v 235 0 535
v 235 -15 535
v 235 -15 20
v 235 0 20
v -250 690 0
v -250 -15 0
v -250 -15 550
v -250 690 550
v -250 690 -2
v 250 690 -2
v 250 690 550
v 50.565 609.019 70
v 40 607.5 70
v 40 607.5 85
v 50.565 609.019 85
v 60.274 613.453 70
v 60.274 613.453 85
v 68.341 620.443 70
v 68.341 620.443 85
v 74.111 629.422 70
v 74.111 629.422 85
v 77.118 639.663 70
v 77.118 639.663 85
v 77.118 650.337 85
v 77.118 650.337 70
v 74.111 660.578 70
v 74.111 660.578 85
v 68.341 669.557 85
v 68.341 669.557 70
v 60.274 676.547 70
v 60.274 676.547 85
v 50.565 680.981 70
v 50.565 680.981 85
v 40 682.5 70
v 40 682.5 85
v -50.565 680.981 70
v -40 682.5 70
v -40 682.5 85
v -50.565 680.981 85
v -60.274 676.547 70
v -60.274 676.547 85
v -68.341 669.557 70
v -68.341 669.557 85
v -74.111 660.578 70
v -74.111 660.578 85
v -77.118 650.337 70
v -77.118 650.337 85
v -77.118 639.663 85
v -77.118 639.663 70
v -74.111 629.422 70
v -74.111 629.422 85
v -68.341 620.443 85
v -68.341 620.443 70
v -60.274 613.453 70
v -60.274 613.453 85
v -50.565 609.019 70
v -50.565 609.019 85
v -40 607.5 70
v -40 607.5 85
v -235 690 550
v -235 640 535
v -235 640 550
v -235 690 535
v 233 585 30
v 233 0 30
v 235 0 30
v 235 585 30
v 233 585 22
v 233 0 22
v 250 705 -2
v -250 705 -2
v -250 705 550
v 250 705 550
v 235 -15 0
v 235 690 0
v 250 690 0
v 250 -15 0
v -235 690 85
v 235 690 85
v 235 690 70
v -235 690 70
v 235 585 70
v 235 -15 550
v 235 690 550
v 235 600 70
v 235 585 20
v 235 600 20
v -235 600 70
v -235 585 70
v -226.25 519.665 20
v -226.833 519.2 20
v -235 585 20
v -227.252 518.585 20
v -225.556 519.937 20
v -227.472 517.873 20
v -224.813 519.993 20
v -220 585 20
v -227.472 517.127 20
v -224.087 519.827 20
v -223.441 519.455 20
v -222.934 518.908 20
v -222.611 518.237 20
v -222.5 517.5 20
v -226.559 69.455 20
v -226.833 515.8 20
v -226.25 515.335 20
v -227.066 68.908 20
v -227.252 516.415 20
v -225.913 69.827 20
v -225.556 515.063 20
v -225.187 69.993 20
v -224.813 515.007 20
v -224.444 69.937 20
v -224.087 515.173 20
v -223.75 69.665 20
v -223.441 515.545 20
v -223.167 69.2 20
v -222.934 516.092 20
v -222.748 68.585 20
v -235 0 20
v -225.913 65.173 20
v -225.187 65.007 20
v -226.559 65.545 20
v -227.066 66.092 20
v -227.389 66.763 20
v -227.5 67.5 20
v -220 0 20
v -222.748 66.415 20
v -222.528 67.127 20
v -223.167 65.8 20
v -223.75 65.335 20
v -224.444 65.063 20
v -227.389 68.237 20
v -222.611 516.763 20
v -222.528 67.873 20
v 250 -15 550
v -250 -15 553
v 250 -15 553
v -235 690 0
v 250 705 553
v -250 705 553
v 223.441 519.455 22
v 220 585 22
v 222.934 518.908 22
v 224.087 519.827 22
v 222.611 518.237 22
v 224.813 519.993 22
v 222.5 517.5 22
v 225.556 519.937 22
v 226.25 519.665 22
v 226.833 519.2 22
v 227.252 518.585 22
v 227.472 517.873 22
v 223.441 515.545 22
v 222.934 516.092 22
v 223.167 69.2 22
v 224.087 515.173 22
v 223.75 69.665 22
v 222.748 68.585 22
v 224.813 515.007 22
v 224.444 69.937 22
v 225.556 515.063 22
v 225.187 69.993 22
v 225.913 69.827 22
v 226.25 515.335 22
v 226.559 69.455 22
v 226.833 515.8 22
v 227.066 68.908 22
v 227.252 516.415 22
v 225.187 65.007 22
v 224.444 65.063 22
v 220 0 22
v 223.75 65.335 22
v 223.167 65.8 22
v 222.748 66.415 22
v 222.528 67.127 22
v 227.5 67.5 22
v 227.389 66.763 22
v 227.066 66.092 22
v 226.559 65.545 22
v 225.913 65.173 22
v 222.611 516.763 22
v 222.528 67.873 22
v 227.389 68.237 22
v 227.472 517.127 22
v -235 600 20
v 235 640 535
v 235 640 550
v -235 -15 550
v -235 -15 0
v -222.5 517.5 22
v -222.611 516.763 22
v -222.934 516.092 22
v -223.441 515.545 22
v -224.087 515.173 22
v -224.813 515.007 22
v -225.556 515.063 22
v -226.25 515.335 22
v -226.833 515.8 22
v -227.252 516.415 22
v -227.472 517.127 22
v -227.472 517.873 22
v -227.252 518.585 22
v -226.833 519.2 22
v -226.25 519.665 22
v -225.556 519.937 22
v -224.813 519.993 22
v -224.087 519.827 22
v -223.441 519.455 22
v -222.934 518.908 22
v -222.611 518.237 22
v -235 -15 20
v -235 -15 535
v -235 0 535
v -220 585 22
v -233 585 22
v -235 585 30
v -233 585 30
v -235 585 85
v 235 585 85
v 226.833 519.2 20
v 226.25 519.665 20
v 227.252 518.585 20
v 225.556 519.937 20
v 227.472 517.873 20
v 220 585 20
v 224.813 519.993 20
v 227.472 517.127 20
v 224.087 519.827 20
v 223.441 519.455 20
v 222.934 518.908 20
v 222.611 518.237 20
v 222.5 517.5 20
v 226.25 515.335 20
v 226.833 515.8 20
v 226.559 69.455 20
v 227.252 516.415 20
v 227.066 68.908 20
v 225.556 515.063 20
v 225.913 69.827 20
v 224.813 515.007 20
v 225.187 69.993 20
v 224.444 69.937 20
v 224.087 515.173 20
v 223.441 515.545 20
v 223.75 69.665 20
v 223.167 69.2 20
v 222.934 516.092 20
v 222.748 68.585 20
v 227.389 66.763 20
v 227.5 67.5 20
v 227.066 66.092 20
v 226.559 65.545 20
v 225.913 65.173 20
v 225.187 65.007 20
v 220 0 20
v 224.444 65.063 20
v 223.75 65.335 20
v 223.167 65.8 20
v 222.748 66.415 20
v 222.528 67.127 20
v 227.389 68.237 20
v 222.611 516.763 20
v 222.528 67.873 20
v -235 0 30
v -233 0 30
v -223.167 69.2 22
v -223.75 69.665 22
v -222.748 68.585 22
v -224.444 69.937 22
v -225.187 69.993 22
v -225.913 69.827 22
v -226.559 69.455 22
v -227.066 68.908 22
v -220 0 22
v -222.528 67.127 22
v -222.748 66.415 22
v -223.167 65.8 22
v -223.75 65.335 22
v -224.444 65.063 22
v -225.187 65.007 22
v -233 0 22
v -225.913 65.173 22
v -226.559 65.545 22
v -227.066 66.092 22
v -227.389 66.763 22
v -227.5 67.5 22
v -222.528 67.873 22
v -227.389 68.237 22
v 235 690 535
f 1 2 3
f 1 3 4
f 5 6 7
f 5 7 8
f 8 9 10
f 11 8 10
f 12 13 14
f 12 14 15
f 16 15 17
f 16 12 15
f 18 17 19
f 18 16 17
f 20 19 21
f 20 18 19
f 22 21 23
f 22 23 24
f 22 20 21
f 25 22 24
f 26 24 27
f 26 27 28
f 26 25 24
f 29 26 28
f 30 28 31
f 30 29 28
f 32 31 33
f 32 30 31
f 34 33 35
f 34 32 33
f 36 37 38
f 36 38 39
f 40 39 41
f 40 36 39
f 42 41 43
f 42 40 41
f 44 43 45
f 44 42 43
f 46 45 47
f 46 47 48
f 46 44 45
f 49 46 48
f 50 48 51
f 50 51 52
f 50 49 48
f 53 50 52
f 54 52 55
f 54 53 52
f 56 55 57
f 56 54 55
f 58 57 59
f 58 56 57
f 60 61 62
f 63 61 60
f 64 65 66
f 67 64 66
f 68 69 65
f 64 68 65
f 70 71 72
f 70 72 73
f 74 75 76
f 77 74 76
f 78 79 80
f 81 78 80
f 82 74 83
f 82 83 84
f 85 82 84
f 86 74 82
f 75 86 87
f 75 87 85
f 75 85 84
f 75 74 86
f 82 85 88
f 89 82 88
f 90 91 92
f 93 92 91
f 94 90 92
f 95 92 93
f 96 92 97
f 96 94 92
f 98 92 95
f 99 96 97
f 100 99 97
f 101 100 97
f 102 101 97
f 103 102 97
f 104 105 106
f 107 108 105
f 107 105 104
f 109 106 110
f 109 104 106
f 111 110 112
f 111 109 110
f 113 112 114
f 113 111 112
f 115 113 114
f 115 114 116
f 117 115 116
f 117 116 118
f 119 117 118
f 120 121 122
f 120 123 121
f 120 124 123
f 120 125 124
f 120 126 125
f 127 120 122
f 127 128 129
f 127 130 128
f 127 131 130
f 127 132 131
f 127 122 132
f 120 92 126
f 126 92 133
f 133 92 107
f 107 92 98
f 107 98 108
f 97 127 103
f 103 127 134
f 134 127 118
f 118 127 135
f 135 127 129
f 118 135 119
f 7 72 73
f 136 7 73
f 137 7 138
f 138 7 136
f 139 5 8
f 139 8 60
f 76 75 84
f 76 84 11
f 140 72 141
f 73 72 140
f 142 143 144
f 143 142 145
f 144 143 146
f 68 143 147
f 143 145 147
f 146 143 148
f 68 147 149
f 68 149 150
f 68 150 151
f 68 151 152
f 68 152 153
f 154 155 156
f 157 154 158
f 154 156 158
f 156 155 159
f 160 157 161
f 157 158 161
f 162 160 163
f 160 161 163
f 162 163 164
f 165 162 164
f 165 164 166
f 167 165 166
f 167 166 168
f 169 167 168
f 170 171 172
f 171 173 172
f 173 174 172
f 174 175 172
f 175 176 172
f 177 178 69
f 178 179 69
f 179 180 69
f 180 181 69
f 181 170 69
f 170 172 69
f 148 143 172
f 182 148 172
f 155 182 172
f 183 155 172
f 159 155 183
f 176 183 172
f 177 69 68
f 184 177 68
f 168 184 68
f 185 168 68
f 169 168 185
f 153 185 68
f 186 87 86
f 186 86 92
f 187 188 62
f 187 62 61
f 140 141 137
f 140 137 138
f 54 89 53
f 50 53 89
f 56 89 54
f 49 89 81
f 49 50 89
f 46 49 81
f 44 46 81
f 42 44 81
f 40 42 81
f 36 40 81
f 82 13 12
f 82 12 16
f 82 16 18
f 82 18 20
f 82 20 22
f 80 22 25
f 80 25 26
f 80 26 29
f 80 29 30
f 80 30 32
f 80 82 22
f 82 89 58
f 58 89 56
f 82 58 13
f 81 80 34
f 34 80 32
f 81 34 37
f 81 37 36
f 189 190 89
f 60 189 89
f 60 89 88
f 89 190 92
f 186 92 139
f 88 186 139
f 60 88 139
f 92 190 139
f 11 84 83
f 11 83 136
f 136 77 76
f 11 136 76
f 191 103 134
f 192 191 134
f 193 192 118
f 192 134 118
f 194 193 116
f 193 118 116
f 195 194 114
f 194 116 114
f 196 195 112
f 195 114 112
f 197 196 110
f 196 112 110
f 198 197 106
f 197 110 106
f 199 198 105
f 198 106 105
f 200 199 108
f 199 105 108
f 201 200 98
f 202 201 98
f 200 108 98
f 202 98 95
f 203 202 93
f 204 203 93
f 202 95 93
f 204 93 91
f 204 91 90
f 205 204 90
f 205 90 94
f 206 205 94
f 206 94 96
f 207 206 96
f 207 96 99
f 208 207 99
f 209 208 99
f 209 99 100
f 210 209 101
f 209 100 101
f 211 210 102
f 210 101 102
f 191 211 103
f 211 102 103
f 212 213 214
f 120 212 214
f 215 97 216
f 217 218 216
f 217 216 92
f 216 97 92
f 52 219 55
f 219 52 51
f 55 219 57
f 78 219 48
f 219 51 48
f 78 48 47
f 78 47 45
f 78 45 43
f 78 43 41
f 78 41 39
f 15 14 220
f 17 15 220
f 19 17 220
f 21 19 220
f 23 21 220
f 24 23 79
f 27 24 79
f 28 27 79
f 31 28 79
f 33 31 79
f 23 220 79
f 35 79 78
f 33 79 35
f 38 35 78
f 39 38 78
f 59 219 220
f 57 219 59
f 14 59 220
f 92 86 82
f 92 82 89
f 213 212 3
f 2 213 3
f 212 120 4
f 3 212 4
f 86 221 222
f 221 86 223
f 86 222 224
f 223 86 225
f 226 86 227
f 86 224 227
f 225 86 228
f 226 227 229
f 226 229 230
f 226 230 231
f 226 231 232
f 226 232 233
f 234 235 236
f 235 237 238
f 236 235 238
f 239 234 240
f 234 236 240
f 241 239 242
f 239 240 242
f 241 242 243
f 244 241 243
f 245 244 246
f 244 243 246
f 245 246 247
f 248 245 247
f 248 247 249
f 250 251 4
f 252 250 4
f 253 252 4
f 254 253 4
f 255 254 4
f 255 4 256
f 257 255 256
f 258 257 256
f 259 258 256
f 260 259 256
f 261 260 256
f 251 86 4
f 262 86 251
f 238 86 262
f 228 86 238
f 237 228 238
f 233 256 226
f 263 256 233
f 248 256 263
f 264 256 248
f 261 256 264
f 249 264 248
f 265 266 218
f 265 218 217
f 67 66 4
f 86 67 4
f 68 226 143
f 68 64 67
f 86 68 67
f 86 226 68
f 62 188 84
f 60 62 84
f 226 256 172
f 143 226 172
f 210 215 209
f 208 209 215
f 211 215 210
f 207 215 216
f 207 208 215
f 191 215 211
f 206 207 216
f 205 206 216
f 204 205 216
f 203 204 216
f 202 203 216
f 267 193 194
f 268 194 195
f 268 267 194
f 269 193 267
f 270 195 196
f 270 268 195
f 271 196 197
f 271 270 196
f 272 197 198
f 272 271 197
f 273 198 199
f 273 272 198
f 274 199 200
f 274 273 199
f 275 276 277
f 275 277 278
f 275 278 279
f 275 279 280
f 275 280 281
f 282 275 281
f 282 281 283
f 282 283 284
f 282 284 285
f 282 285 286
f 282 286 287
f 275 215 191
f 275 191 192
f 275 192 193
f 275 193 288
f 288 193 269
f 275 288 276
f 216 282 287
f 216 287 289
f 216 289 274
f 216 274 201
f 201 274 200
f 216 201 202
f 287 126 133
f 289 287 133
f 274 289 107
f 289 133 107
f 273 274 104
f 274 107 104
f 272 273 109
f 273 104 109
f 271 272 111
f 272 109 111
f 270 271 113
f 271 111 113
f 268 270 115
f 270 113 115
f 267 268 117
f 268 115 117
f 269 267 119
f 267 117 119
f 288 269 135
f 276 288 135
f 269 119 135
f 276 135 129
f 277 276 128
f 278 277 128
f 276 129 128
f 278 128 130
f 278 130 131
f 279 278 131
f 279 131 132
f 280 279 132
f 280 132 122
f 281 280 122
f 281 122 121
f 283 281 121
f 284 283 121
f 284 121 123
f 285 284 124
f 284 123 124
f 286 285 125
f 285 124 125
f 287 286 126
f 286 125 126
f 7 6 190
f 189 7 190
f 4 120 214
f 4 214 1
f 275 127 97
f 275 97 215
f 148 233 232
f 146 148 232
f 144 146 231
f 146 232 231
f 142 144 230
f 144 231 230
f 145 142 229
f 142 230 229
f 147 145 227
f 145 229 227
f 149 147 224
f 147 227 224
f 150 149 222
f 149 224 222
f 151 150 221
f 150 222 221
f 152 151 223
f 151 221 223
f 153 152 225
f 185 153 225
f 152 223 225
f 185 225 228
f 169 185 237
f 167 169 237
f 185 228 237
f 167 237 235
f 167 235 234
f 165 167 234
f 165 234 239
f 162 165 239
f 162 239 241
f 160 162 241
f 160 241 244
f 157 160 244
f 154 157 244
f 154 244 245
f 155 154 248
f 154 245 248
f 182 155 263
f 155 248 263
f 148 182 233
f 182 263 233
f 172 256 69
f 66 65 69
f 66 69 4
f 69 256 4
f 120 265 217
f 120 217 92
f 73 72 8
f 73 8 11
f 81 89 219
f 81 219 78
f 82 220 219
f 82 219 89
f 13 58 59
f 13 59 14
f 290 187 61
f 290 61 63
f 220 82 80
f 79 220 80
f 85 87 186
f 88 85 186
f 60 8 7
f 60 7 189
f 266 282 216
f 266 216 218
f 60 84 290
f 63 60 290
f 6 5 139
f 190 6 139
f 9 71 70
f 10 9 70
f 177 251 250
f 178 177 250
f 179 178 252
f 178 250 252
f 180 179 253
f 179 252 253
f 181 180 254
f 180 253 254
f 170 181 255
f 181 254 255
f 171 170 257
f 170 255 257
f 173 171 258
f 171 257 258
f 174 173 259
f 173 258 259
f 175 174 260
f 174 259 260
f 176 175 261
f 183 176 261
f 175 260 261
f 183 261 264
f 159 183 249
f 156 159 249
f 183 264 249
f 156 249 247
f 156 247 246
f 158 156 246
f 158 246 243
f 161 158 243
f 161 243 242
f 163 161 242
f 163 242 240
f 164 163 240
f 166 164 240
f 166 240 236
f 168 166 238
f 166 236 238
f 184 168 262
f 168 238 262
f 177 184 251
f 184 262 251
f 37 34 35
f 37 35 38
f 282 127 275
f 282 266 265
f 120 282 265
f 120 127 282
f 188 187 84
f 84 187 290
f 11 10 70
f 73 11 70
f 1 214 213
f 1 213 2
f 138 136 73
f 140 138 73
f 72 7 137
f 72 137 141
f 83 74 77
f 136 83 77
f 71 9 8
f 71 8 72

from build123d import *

# Parameters (mm, degrees)
SKETCH1_W                       = 15
SKETCH1_H                       = 705
BOSS_EXTRUDE1_DEPTH             = 550
BOSS_EXTRUDE1_2_DEPTH           = 550
BOSS_EXTRUDE2_START             = 20
SKETCH2_W                       = 470
SKETCH2_H                       = 15
BOSS_EXTRUDE2_DEPTH             = 515
BOSS_EXTRUDE3_START             = -2
SKETCH3_W                       = 500
SKETCH3_H                       = 15
BOSS_EXTRUDE3_DEPTH             = 552
SKETCH4_W                       = 470
SKETCH4_H                       = 15
BOSS_EXTRUDE4_DEPTH             = 50
BOSS_EXTRUDE5_REACH             = 930.453
SKETCH5_W                       = 15
SKETCH5_H                       = 50
SKETCH5_H_2                     = 105
BOSS_EXTRUDE5_DIRECTION_2_REACH = 930.453
SKETCH7_W                       = 500
SKETCH7_H                       = 720
BOSS_EXTRUDE6_DEPTH             = 3
CUT_EXTRUDE2_DEPTH              = 15
ALU_PROFILES_DEPTH              = 585
SKETCH9_R                       = 2.5
CUT_EXTRUDE1_DEPTH              = 2


with BuildPart() as part:
    # Sketch1 → Boss-Extrude1 (new body)
    with BuildSketch(Plane.XY):
        with Locations((-242.5, 337.5)):
            Rectangle(SKETCH1_W, SKETCH1_H)
    extrude(amount=BOSS_EXTRUDE1_DEPTH)



with BuildPart() as body_2:
    # Sketch1 → Boss-Extrude1 2 (new body)
    with BuildSketch(Plane.XY):
        with Locations((242.5, 337.5)):
            Rectangle(SKETCH1_W, SKETCH1_H)
    extrude(amount=BOSS_EXTRUDE1_2_DEPTH)


with BuildPart() as body_3:
    # Sketch2 → Boss-Extrude2 (new body)
    with BuildSketch(Plane.XY.offset(BOSS_EXTRUDE2_START)):
        with Locations((0, -7.5)):
            Rectangle(SKETCH2_W, SKETCH2_H)
    extrude(amount=BOSS_EXTRUDE2_DEPTH)


with BuildPart() as body_4:
    # Sketch3 → Boss-Extrude3 (new body)
    with BuildSketch(Plane.XY.offset(BOSS_EXTRUDE3_START)):
        with Locations((0, 697.5)):
            Rectangle(SKETCH3_W, SKETCH3_H)
    extrude(amount=BOSS_EXTRUDE3_DEPTH)


with BuildPart() as part_1:
    add(part.part)

    add(body_2.part)  # Boss-Extrude4 merges body 2
    # Sketch4 → Boss-Extrude4 (add)
    with BuildSketch(Plane(origin=(0, 0, 20), x_dir=(-1, 0, 0), z_dir=(0, 0, -1))):
        with Locations((0, 592.5)):
            Rectangle(SKETCH4_W, SKETCH4_H)
    extrude(amount=-BOSS_EXTRUDE4_DEPTH)


with BuildPart() as body_4_2:

    # Sketch5 → Boss-Extrude5 (new, up to next)
    with BuildSketch(Plane(origin=(0, 0, 0), x_dir=(0, 0, -1), z_dir=(1, 0, 0)), mode=Mode.PRIVATE) as boss_extrude5_sk1:
        with Locations((-542.5, 665)):
            Rectangle(SKETCH5_W, SKETCH5_H)
    boss_extrude5_tool1 = extrude(boss_extrude5_sk1.sketch, amount=BOSS_EXTRUDE5_REACH, mode=Mode.PRIVATE) - part_1.part
    # Sketch5 → Boss-Extrude5 (new, up to next)
    with BuildSketch(Plane(origin=(0, 0, 0), x_dir=(0, 0, -1), z_dir=(1, 0, 0)), mode=Mode.PRIVATE) as boss_extrude5_sk2:
        with Locations((-77.5, 637.5)):
            Rectangle(SKETCH5_W, SKETCH5_H_2)
    boss_extrude5_tool2 = extrude(boss_extrude5_sk2.sketch, amount=BOSS_EXTRUDE5_REACH, mode=Mode.PRIVATE) - part_1.part
    add(boss_extrude5_tool1.solids().sort_by_distance((0, 665, 542.5))[0])
    add(boss_extrude5_tool2.solids().sort_by_distance((0, 637.5, 77.5))[0])


    # Sketch5 → Boss-Extrude5 direction 2 (add, up to next)
    with BuildSketch(Plane(origin=(0, 0, 0), x_dir=(0, 0, -1), z_dir=(1, 0, 0)), mode=Mode.PRIVATE) as boss_extrude5_direction_2_sk1:
        with Locations((-542.5, 665)):
            Rectangle(SKETCH5_W, SKETCH5_H)
    boss_extrude5_direction_2_tool1 = extrude(boss_extrude5_direction_2_sk1.sketch, amount=-BOSS_EXTRUDE5_DIRECTION_2_REACH, mode=Mode.PRIVATE) - part_1.part
    # Sketch5 → Boss-Extrude5 direction 2 (add, up to next)
    with BuildSketch(Plane(origin=(0, 0, 0), x_dir=(0, 0, -1), z_dir=(1, 0, 0)), mode=Mode.PRIVATE) as boss_extrude5_direction_2_sk2:
        with Locations((-77.5, 637.5)):
            Rectangle(SKETCH5_W, SKETCH5_H_2)
    boss_extrude5_direction_2_tool2 = extrude(boss_extrude5_direction_2_sk2.sketch, amount=-BOSS_EXTRUDE5_DIRECTION_2_REACH, mode=Mode.PRIVATE) - part_1.part
    add(boss_extrude5_direction_2_tool1.solids().sort_by_distance((0, 665, 542.5))[0])
    add(boss_extrude5_direction_2_tool2.solids().sort_by_distance((0, 637.5, 77.5))[0])

    # Sketch10 → Cut-Extrude2 (cut)
    with BuildSketch(Plane(origin=(0, 0, 70), x_dir=(-1, 0, 0), z_dir=(0, 0, -1))):
        with BuildLine():
            Line((-40, 682.5), (40, 682.5))
            ThreePointArc((40, 682.5), (77.5, 645), (40, 607.5))
            Line((40, 607.5), (-40, 607.5))
            ThreePointArc((-40, 607.5), (-77.5, 645), (-40, 682.5))
        make_face()
    extrude(amount=-CUT_EXTRUDE2_DEPTH, mode=Mode.SUBTRACT)


with BuildPart() as body_5:
    # Sketch7 → Boss-Extrude6 (new body)
    with BuildSketch(Plane.XY.offset(550)):
        with Locations((0, 345)):
            Rectangle(SKETCH7_W, SKETCH7_H)
    extrude(amount=BOSS_EXTRUDE6_DEPTH)


with BuildPart() as body_6:
    # Sketch8 → Alu-profiles (new body)
    with BuildSketch(Plane(origin=(0, 0, 0), x_dir=(1, 0, 0), z_dir=(0, 1, 0))):
        Polygon((235, -30), (235, -20), (220, -20), (220, -22), (233, -22), (233, -30), align=None)
    extrude(amount=ALU_PROFILES_DEPTH)


with BuildPart() as body_7:
    # Mirror2: mirrored copy
    add(body_6.part.mirror(Plane(origin=(0, 0, 0), x_dir=(0, 0, 1), z_dir=(1, 0, 0))))


with BuildPart() as cut_extrude1_tool:
    # Sketch9 → Cut-Extrude1 (new body)
    with BuildSketch(Plane(origin=(0, 0, 20), x_dir=(-1, 0, 0), z_dir=(0, 0, -1))):
        with Locations((-225, 517.5)):
            Circle(SKETCH9_R)
        with Locations(Location((-225, 67.5, 0), (0, 0, 180))):
            Circle(SKETCH9_R)
        with Locations((225, 67.5)):
            Circle(SKETCH9_R)
        with Locations(Location((225, 517.5, 0), (0, 0, 180))):
            Circle(SKETCH9_R)
    extrude(amount=-CUT_EXTRUDE1_DEPTH)


with BuildPart() as body_6_1:
    add(body_6.part)

    # Cut-Extrude1: cut by cut_extrude1_tool
    add(cut_extrude1_tool.part, mode=Mode.SUBTRACT)


with BuildPart() as body_7_1:
    add(body_7.part)

    # Cut-Extrude1: cut by cut_extrude1_tool
    add(cut_extrude1_tool.part, mode=Mode.SUBTRACT)


solid = Compound([body_3.part, body_4.part, part_1.part, body_4_2.part, body_5.part, body_6_1.part, body_7_1.part])
